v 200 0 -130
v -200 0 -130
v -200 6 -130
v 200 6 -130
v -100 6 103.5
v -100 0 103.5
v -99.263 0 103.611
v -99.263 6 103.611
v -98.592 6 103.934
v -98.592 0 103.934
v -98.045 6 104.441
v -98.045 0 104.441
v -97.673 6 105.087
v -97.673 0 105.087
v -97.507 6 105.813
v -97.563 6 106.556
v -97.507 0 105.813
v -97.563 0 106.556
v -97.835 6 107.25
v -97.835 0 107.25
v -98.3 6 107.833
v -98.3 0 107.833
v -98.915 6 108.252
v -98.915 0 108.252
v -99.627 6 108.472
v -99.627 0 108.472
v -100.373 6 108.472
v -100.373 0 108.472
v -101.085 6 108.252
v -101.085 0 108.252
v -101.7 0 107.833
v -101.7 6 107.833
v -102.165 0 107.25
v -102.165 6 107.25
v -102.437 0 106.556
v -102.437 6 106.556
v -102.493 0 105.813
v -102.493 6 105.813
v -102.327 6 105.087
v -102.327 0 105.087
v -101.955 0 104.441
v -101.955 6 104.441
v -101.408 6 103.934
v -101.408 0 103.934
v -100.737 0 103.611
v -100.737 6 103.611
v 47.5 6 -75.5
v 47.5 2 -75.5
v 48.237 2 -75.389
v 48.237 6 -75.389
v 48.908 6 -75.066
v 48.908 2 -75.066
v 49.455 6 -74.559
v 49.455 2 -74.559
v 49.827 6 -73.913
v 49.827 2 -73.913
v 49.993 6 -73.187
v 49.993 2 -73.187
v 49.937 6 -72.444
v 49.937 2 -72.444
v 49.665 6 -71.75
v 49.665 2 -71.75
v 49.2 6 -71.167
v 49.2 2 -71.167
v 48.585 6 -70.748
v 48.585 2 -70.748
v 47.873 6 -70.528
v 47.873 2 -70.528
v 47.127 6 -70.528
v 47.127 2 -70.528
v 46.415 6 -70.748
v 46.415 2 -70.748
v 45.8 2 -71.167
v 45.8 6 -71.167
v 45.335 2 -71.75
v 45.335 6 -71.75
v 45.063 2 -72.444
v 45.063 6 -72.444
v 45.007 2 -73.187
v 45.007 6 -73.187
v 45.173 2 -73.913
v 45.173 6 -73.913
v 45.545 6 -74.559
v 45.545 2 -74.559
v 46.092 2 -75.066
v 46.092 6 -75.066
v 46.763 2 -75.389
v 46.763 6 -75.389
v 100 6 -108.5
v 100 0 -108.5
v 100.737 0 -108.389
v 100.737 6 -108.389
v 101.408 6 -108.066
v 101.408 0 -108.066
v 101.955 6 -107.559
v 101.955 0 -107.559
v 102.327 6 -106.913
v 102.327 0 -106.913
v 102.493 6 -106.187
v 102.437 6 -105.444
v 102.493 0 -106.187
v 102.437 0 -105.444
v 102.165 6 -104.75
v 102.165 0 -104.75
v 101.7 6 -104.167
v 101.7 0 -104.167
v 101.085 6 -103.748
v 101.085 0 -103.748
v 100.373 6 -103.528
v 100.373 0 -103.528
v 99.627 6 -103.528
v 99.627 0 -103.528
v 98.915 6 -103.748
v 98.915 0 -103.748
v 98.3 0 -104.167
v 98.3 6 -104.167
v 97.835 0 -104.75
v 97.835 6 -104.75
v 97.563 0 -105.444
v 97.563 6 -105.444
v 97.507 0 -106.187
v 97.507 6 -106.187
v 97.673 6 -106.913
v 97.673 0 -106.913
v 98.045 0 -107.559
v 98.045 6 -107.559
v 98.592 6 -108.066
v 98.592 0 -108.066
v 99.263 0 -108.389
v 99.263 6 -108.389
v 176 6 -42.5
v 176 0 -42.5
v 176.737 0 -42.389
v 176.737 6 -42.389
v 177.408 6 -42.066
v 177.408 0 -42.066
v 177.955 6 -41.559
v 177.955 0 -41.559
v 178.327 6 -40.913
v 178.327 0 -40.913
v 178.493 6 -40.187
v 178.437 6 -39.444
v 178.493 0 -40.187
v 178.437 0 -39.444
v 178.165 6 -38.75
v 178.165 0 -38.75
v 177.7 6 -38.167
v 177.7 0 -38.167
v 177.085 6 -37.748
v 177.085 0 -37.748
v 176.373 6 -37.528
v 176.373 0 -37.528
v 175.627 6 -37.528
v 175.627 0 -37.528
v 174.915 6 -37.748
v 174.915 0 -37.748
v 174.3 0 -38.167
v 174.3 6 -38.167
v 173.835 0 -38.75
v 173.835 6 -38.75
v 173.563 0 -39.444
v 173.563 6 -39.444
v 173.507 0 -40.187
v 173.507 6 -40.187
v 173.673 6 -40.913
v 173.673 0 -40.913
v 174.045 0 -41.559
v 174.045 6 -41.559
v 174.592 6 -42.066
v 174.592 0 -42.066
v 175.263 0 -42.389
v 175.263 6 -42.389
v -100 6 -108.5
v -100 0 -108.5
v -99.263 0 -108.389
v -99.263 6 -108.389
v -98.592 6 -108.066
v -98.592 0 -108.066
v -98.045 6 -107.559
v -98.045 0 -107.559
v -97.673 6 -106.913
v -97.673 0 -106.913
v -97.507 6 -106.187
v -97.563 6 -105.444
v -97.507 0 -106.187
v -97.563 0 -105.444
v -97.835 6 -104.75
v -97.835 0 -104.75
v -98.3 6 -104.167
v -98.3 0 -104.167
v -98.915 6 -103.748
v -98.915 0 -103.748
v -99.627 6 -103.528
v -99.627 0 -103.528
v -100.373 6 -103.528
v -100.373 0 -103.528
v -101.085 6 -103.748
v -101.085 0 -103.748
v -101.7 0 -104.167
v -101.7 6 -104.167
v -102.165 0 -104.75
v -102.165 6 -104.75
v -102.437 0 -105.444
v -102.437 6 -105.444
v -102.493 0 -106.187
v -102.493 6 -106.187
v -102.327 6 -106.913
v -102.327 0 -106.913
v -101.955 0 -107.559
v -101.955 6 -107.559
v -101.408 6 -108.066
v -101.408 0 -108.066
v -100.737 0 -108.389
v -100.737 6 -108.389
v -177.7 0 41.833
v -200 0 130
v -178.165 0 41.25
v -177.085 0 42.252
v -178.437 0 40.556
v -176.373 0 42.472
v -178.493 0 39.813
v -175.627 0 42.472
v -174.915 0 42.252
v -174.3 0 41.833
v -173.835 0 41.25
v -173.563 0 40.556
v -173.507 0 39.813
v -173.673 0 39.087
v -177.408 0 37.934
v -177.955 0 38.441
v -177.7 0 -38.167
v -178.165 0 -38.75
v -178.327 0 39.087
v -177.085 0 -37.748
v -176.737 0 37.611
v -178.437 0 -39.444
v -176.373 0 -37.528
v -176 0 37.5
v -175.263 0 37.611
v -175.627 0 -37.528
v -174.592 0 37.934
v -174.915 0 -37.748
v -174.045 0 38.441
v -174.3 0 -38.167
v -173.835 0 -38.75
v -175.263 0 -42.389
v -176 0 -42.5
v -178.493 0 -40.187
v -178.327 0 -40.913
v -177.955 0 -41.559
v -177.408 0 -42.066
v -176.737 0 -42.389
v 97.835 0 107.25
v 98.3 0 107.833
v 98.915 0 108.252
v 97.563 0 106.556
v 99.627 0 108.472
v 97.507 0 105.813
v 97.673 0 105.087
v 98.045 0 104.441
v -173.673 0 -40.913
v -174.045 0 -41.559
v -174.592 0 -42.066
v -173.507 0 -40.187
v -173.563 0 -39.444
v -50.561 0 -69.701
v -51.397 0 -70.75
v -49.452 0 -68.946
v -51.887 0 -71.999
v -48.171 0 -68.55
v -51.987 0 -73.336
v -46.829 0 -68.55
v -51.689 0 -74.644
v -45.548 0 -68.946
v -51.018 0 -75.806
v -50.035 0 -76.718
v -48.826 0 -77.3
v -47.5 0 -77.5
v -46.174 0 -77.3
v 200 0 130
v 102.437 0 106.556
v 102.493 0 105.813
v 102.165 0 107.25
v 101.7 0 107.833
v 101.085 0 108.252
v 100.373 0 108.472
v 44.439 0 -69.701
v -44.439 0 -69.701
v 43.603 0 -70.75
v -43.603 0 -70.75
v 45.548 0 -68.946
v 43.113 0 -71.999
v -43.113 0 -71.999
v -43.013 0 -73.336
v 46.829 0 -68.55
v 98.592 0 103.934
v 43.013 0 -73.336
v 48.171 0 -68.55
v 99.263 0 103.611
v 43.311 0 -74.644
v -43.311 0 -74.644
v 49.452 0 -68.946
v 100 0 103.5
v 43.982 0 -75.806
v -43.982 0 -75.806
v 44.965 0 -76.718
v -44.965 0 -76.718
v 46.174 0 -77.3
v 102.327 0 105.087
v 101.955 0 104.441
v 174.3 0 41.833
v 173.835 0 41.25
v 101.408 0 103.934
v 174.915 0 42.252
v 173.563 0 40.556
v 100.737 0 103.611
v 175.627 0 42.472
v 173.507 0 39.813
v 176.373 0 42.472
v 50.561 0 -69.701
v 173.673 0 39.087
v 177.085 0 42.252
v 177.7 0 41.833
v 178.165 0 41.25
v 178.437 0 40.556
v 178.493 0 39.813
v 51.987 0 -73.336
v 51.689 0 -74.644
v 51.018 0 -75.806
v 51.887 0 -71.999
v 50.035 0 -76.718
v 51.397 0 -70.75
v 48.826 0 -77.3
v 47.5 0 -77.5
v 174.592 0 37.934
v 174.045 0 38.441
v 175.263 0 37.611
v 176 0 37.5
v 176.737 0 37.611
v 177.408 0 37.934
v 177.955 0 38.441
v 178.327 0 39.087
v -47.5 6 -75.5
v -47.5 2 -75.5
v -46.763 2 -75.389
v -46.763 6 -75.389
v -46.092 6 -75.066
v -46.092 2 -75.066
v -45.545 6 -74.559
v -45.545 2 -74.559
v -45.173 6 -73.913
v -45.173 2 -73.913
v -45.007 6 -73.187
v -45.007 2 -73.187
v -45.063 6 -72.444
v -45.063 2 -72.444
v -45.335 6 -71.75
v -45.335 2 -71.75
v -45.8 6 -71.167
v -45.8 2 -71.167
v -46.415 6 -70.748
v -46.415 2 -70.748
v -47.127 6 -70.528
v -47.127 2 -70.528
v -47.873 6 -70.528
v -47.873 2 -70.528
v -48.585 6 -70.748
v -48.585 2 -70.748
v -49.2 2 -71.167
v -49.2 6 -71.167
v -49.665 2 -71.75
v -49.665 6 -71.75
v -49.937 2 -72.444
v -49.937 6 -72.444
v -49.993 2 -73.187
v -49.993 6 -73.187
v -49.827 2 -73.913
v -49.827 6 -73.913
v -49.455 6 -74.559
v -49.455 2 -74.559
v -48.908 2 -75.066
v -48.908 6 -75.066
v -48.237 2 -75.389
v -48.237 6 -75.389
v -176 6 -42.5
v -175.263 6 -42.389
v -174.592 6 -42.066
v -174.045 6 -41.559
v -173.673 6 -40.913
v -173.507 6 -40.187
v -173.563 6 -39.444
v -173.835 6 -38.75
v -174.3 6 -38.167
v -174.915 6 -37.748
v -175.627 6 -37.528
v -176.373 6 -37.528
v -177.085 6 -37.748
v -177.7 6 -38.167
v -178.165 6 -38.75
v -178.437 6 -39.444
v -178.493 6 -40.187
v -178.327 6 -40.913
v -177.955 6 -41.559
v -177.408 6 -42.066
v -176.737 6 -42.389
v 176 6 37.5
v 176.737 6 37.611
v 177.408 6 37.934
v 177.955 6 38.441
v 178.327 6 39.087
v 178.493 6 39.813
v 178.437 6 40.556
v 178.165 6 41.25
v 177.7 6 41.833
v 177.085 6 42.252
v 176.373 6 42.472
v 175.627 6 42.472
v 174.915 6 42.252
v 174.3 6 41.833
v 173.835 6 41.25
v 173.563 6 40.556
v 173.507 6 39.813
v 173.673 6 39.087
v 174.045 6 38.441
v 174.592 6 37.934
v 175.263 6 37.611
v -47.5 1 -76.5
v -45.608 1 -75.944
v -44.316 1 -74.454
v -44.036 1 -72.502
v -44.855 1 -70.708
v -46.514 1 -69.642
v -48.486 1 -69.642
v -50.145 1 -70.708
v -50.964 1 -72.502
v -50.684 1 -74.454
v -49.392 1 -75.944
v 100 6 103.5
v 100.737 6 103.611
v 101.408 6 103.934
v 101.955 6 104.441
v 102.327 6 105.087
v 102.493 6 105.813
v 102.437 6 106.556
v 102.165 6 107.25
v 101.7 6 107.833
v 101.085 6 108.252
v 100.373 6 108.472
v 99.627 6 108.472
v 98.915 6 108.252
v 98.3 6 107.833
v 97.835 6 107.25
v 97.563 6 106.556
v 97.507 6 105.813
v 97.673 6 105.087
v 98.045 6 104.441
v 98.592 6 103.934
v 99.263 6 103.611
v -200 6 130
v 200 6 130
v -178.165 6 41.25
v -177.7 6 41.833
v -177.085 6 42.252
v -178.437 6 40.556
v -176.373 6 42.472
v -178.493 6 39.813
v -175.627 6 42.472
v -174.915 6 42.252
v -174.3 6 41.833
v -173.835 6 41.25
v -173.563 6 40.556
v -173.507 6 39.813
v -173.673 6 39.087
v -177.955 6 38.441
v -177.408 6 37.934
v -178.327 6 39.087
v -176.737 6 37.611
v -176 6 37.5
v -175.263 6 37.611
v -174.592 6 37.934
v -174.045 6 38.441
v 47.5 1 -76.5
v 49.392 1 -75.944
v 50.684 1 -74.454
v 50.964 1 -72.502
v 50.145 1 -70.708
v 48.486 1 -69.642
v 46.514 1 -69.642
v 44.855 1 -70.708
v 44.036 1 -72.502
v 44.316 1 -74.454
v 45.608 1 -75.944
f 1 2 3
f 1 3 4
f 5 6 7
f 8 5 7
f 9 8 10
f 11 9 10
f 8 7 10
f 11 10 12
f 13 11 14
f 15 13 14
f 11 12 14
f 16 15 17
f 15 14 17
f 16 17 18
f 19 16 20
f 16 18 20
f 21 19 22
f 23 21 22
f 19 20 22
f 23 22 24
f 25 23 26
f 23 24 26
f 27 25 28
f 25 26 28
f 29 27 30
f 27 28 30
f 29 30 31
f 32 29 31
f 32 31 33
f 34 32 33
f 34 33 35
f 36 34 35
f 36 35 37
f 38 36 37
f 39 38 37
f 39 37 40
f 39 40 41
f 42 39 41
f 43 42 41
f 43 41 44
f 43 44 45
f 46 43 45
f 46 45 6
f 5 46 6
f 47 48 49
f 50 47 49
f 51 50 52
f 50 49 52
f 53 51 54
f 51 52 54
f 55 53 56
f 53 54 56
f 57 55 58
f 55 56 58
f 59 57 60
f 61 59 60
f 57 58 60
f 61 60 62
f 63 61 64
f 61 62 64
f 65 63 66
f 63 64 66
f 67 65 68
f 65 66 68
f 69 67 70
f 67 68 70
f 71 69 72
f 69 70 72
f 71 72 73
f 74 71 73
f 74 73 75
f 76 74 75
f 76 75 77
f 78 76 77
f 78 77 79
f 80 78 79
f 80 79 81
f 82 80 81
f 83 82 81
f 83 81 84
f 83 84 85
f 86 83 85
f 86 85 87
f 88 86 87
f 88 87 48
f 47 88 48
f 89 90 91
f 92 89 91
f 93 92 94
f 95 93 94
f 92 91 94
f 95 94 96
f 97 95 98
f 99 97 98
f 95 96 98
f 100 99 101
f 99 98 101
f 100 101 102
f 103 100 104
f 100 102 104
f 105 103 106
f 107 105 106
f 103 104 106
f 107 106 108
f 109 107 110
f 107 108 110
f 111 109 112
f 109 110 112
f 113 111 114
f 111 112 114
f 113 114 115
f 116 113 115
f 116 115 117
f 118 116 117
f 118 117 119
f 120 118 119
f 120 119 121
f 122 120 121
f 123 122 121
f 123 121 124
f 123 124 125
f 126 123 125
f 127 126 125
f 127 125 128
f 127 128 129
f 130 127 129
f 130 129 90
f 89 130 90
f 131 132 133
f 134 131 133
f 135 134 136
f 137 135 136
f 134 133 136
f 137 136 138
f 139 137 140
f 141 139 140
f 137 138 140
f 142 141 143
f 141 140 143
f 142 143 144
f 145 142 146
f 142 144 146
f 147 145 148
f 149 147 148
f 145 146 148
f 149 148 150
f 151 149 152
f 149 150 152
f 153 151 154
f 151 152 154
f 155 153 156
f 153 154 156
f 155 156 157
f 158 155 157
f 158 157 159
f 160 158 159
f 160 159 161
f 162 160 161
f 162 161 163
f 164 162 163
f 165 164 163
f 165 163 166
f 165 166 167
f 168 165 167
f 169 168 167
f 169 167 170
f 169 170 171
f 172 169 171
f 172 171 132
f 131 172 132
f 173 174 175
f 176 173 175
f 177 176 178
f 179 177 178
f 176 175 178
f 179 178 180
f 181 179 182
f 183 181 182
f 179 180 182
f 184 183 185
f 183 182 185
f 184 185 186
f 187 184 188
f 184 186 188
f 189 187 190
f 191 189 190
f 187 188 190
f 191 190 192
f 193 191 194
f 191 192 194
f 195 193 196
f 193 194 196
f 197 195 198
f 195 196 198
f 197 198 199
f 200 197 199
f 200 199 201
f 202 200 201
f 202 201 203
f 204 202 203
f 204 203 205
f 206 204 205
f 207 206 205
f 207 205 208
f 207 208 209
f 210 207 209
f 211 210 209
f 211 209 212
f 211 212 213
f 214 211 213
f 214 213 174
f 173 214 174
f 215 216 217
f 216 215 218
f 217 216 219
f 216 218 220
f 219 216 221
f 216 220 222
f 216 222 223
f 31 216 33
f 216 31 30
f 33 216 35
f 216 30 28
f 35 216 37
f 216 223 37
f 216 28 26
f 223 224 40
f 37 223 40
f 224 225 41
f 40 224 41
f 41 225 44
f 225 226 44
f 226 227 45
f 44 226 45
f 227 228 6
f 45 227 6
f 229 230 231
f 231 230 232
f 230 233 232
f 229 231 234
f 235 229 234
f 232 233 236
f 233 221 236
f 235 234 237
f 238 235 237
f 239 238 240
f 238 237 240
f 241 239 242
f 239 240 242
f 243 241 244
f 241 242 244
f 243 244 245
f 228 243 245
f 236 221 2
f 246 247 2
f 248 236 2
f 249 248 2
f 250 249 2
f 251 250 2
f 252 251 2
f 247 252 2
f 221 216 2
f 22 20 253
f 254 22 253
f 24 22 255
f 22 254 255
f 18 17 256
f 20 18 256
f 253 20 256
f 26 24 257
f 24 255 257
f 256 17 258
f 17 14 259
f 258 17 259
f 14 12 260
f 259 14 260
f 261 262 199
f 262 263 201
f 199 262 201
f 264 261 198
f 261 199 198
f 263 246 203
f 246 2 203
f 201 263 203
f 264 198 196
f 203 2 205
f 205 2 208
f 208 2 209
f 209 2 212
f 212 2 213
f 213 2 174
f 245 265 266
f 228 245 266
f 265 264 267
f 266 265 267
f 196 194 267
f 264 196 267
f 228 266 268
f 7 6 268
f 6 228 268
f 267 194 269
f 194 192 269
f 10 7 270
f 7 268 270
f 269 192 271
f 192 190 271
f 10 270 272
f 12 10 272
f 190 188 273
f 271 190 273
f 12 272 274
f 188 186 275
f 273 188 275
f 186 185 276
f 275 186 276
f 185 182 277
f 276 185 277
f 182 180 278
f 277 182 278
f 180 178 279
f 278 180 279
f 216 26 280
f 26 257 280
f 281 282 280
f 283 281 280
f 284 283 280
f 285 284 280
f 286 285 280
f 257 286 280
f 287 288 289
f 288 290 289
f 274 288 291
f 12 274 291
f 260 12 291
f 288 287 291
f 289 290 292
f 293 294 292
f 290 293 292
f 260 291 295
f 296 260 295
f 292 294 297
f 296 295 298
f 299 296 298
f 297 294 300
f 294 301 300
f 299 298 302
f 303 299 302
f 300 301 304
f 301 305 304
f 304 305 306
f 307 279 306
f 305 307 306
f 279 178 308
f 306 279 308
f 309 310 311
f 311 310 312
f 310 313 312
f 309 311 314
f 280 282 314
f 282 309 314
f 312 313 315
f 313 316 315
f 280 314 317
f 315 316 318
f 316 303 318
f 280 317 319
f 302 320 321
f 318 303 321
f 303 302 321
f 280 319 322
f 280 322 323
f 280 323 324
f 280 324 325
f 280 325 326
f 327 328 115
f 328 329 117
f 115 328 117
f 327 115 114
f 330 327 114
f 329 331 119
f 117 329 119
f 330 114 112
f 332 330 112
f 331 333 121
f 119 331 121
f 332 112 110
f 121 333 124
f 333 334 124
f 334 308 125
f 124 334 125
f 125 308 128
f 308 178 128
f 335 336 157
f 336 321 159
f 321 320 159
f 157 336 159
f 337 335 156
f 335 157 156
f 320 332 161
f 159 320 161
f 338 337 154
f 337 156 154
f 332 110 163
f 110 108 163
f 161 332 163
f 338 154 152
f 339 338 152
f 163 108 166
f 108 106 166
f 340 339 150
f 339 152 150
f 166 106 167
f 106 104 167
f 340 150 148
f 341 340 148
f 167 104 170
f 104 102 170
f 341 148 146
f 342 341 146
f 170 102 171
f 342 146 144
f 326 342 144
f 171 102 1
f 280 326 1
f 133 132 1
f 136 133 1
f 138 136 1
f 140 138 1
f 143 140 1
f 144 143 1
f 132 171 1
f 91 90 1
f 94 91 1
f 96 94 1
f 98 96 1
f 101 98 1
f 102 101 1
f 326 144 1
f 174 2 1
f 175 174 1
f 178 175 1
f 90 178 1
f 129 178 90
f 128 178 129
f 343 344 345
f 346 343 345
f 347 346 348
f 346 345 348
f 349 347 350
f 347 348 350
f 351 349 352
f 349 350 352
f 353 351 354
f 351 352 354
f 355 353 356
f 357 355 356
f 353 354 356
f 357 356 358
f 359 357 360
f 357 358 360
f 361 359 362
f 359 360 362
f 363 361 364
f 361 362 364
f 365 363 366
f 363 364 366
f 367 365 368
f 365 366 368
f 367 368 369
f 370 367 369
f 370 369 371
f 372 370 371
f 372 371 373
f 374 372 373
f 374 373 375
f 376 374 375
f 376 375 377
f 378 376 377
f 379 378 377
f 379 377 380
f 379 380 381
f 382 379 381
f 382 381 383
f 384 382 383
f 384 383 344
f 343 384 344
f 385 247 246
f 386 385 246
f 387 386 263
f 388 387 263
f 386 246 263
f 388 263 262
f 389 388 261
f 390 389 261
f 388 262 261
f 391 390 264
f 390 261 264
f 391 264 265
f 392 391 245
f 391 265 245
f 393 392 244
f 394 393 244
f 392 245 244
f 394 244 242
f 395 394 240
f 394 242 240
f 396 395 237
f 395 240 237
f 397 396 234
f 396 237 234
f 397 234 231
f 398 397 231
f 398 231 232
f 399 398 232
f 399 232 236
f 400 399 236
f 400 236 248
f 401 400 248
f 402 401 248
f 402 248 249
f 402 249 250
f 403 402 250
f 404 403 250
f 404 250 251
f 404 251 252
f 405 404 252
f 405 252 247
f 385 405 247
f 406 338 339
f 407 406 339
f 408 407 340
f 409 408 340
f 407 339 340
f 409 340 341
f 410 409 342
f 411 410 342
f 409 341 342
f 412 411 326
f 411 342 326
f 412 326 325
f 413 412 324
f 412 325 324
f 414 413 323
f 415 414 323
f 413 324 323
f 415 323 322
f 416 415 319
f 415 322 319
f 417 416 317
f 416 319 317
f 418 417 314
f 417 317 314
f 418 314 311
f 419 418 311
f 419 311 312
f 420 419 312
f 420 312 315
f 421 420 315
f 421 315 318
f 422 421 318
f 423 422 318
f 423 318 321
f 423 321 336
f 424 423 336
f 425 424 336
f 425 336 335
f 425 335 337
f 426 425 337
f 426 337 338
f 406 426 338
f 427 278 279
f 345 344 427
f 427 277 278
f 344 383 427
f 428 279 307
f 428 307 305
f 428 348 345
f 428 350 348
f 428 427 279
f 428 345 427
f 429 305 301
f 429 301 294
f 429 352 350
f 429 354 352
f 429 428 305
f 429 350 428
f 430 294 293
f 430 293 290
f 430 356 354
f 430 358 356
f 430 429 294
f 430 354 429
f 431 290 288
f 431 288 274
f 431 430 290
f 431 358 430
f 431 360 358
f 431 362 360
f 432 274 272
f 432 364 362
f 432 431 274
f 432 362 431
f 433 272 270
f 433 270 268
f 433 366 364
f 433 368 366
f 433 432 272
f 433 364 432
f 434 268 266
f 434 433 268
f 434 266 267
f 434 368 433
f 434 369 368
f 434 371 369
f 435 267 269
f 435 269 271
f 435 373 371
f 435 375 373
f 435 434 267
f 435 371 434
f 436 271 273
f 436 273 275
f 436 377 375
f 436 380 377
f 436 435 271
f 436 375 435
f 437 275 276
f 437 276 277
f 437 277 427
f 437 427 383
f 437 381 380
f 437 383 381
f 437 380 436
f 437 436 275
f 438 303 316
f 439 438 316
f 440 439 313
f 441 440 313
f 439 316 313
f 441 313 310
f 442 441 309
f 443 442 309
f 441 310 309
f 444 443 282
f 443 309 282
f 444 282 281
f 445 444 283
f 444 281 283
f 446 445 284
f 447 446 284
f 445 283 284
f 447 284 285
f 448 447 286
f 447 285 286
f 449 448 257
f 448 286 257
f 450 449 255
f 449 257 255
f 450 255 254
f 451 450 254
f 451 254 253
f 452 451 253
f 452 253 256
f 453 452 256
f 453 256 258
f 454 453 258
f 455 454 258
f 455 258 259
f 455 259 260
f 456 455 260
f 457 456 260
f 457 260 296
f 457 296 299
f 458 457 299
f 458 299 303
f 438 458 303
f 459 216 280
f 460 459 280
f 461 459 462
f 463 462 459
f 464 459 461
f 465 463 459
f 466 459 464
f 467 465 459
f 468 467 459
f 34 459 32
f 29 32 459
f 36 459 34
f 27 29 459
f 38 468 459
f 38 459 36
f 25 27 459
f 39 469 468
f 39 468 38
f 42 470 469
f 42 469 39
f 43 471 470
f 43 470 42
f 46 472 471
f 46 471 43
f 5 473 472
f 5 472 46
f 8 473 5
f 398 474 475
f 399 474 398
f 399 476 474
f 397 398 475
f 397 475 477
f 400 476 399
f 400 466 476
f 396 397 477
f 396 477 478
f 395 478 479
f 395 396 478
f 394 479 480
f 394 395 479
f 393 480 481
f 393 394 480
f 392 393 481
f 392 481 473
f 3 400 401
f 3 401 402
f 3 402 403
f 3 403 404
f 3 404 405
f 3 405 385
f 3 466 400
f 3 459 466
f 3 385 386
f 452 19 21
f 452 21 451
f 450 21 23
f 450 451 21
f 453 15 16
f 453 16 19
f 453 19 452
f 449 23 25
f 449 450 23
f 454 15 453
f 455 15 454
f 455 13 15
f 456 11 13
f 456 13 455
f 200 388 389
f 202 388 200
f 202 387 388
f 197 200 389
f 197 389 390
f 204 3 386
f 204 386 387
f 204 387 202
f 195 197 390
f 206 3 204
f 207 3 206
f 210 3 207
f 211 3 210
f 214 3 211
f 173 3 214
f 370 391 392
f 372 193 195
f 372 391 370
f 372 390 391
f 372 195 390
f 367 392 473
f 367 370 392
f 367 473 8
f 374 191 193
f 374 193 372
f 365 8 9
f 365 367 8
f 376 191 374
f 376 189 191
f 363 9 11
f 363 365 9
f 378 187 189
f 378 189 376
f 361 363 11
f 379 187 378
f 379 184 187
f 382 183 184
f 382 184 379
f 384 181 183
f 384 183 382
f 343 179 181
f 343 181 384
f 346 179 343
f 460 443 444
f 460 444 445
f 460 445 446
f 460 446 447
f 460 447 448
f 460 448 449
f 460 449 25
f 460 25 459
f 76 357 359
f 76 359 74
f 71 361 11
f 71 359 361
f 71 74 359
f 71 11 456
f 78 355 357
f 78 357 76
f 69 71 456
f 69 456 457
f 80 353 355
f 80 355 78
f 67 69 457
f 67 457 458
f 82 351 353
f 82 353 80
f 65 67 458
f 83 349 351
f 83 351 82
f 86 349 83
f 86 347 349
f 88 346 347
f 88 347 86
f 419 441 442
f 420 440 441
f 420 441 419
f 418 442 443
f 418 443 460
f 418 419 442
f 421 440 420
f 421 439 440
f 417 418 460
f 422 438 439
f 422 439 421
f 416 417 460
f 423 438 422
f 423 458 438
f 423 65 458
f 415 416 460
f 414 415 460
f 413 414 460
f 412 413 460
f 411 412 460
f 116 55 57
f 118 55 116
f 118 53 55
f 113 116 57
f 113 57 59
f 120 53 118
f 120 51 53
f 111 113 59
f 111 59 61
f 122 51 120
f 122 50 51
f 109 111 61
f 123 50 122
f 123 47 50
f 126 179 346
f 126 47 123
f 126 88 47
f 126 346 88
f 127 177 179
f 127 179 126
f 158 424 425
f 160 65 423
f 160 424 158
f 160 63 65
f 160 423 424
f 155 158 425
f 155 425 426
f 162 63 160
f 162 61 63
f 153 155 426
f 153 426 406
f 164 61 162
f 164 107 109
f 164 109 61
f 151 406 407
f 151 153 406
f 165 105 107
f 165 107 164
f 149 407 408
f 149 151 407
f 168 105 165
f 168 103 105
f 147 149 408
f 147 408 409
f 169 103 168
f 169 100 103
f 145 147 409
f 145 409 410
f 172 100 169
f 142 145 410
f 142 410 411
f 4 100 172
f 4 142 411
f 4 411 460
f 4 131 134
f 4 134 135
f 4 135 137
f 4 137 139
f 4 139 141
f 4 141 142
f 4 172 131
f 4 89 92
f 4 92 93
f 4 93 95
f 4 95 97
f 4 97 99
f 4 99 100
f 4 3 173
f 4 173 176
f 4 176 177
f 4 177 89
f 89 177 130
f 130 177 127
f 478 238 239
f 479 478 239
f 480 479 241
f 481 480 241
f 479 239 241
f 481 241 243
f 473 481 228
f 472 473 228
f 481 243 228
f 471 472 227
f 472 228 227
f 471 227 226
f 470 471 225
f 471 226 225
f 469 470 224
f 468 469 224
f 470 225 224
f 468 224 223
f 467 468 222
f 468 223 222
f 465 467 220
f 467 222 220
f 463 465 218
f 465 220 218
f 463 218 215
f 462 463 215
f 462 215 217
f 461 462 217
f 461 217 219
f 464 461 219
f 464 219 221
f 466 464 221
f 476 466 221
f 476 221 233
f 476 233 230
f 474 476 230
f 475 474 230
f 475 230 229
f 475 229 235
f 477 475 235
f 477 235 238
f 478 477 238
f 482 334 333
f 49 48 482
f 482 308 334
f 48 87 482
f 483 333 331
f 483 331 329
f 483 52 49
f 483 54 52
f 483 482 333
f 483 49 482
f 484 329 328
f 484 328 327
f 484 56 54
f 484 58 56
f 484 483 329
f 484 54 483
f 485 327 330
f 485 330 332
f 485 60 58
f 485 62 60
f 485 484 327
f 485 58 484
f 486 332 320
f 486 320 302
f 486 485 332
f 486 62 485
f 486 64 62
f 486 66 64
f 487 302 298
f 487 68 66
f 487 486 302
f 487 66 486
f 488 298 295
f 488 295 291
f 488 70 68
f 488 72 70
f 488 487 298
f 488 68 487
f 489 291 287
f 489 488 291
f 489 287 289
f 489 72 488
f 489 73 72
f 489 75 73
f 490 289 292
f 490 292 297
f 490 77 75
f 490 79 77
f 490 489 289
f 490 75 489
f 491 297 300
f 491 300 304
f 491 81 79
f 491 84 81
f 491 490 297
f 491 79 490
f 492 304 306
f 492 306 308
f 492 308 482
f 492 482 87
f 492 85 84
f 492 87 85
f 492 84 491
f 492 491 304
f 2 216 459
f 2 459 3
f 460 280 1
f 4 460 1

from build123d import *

# Parameters (mm, degrees)
ESQUISSE1_W             = 400
ESQUISSE1_H             = 260
BOSS_EXTRU_1_DEPTH      = 6
ESQUISSE2_R             = 2.5
ENL_V_MAT_EXTRU_1_DEPTH = 239.612656831
ESQUISSE3_R             = 2.5
ENL_V_MAT_EXTRU_2_DEPTH = 239.612656831
CHANFREIN2_SIZE         = 2


with BuildPart() as part:
    # Esquisse1 → Boss.-Extru.1 (new body)
    with BuildSketch(Plane(origin=(0, 0, 0), x_dir=(1, 0, 0), z_dir=(0, 1, 0))):
        Rectangle(ESQUISSE1_W, ESQUISSE1_H)
    extrude(amount=BOSS_EXTRU_1_DEPTH)

    # Esquisse2 → Enlèv. mat.-Extru.1 (cut, through all)
    with BuildSketch(Plane.XZ):
        with Locations(Location((-100, 106, 0), (0, 0, 270))):
            Circle(ESQUISSE2_R)
        with Locations(Location((100, 106, 0), (0, 0, 270))):
            Circle(ESQUISSE2_R)
        with Locations(Location((176, 40, 0), (0, 0, 270))):
            Circle(ESQUISSE2_R)
        with Locations(Location((176, -40, 0), (0, 0, 270))):
            Circle(ESQUISSE2_R)
        with Locations(Location((100, -106, 0), (0, 0, 270))):
            Circle(ESQUISSE2_R)
        with Locations(Location((-100, -106, 0), (0, 0, 270))):
            Circle(ESQUISSE2_R)
        with Locations(Location((-176, -40, 0), (0, 0, 270))):
            Circle(ESQUISSE2_R)
        with Locations(Location((-176, 40, 0), (0, 0, 270))):
            Circle(ESQUISSE2_R)
    extrude(amount=-ENL_V_MAT_EXTRU_1_DEPTH, mode=Mode.SUBTRACT)

    # Esquisse3 → Enlèv. mat.-Extru.2 (cut, through all)
    with BuildSketch(Plane.XZ):
        with Locations(Location((47.5, -73, 0), (0, 0, 270))):
            Circle(ESQUISSE3_R)
        with Locations(Location((-47.5, -73, 0), (0, 0, 270))):
            Circle(ESQUISSE3_R)
    extrude(amount=-ENL_V_MAT_EXTRU_2_DEPTH, mode=Mode.SUBTRACT)

    # Chanfrein2
    chanfrein2_edges = [part.edges().sort_by_distance(p)[0] for p in [
        (47.5, 0, -70.5),
        (-47.5, 0, -70.5),
    ]]
    chamfer(chanfrein2_edges, length=CHANFREIN2_SIZE)


solid = part.part
